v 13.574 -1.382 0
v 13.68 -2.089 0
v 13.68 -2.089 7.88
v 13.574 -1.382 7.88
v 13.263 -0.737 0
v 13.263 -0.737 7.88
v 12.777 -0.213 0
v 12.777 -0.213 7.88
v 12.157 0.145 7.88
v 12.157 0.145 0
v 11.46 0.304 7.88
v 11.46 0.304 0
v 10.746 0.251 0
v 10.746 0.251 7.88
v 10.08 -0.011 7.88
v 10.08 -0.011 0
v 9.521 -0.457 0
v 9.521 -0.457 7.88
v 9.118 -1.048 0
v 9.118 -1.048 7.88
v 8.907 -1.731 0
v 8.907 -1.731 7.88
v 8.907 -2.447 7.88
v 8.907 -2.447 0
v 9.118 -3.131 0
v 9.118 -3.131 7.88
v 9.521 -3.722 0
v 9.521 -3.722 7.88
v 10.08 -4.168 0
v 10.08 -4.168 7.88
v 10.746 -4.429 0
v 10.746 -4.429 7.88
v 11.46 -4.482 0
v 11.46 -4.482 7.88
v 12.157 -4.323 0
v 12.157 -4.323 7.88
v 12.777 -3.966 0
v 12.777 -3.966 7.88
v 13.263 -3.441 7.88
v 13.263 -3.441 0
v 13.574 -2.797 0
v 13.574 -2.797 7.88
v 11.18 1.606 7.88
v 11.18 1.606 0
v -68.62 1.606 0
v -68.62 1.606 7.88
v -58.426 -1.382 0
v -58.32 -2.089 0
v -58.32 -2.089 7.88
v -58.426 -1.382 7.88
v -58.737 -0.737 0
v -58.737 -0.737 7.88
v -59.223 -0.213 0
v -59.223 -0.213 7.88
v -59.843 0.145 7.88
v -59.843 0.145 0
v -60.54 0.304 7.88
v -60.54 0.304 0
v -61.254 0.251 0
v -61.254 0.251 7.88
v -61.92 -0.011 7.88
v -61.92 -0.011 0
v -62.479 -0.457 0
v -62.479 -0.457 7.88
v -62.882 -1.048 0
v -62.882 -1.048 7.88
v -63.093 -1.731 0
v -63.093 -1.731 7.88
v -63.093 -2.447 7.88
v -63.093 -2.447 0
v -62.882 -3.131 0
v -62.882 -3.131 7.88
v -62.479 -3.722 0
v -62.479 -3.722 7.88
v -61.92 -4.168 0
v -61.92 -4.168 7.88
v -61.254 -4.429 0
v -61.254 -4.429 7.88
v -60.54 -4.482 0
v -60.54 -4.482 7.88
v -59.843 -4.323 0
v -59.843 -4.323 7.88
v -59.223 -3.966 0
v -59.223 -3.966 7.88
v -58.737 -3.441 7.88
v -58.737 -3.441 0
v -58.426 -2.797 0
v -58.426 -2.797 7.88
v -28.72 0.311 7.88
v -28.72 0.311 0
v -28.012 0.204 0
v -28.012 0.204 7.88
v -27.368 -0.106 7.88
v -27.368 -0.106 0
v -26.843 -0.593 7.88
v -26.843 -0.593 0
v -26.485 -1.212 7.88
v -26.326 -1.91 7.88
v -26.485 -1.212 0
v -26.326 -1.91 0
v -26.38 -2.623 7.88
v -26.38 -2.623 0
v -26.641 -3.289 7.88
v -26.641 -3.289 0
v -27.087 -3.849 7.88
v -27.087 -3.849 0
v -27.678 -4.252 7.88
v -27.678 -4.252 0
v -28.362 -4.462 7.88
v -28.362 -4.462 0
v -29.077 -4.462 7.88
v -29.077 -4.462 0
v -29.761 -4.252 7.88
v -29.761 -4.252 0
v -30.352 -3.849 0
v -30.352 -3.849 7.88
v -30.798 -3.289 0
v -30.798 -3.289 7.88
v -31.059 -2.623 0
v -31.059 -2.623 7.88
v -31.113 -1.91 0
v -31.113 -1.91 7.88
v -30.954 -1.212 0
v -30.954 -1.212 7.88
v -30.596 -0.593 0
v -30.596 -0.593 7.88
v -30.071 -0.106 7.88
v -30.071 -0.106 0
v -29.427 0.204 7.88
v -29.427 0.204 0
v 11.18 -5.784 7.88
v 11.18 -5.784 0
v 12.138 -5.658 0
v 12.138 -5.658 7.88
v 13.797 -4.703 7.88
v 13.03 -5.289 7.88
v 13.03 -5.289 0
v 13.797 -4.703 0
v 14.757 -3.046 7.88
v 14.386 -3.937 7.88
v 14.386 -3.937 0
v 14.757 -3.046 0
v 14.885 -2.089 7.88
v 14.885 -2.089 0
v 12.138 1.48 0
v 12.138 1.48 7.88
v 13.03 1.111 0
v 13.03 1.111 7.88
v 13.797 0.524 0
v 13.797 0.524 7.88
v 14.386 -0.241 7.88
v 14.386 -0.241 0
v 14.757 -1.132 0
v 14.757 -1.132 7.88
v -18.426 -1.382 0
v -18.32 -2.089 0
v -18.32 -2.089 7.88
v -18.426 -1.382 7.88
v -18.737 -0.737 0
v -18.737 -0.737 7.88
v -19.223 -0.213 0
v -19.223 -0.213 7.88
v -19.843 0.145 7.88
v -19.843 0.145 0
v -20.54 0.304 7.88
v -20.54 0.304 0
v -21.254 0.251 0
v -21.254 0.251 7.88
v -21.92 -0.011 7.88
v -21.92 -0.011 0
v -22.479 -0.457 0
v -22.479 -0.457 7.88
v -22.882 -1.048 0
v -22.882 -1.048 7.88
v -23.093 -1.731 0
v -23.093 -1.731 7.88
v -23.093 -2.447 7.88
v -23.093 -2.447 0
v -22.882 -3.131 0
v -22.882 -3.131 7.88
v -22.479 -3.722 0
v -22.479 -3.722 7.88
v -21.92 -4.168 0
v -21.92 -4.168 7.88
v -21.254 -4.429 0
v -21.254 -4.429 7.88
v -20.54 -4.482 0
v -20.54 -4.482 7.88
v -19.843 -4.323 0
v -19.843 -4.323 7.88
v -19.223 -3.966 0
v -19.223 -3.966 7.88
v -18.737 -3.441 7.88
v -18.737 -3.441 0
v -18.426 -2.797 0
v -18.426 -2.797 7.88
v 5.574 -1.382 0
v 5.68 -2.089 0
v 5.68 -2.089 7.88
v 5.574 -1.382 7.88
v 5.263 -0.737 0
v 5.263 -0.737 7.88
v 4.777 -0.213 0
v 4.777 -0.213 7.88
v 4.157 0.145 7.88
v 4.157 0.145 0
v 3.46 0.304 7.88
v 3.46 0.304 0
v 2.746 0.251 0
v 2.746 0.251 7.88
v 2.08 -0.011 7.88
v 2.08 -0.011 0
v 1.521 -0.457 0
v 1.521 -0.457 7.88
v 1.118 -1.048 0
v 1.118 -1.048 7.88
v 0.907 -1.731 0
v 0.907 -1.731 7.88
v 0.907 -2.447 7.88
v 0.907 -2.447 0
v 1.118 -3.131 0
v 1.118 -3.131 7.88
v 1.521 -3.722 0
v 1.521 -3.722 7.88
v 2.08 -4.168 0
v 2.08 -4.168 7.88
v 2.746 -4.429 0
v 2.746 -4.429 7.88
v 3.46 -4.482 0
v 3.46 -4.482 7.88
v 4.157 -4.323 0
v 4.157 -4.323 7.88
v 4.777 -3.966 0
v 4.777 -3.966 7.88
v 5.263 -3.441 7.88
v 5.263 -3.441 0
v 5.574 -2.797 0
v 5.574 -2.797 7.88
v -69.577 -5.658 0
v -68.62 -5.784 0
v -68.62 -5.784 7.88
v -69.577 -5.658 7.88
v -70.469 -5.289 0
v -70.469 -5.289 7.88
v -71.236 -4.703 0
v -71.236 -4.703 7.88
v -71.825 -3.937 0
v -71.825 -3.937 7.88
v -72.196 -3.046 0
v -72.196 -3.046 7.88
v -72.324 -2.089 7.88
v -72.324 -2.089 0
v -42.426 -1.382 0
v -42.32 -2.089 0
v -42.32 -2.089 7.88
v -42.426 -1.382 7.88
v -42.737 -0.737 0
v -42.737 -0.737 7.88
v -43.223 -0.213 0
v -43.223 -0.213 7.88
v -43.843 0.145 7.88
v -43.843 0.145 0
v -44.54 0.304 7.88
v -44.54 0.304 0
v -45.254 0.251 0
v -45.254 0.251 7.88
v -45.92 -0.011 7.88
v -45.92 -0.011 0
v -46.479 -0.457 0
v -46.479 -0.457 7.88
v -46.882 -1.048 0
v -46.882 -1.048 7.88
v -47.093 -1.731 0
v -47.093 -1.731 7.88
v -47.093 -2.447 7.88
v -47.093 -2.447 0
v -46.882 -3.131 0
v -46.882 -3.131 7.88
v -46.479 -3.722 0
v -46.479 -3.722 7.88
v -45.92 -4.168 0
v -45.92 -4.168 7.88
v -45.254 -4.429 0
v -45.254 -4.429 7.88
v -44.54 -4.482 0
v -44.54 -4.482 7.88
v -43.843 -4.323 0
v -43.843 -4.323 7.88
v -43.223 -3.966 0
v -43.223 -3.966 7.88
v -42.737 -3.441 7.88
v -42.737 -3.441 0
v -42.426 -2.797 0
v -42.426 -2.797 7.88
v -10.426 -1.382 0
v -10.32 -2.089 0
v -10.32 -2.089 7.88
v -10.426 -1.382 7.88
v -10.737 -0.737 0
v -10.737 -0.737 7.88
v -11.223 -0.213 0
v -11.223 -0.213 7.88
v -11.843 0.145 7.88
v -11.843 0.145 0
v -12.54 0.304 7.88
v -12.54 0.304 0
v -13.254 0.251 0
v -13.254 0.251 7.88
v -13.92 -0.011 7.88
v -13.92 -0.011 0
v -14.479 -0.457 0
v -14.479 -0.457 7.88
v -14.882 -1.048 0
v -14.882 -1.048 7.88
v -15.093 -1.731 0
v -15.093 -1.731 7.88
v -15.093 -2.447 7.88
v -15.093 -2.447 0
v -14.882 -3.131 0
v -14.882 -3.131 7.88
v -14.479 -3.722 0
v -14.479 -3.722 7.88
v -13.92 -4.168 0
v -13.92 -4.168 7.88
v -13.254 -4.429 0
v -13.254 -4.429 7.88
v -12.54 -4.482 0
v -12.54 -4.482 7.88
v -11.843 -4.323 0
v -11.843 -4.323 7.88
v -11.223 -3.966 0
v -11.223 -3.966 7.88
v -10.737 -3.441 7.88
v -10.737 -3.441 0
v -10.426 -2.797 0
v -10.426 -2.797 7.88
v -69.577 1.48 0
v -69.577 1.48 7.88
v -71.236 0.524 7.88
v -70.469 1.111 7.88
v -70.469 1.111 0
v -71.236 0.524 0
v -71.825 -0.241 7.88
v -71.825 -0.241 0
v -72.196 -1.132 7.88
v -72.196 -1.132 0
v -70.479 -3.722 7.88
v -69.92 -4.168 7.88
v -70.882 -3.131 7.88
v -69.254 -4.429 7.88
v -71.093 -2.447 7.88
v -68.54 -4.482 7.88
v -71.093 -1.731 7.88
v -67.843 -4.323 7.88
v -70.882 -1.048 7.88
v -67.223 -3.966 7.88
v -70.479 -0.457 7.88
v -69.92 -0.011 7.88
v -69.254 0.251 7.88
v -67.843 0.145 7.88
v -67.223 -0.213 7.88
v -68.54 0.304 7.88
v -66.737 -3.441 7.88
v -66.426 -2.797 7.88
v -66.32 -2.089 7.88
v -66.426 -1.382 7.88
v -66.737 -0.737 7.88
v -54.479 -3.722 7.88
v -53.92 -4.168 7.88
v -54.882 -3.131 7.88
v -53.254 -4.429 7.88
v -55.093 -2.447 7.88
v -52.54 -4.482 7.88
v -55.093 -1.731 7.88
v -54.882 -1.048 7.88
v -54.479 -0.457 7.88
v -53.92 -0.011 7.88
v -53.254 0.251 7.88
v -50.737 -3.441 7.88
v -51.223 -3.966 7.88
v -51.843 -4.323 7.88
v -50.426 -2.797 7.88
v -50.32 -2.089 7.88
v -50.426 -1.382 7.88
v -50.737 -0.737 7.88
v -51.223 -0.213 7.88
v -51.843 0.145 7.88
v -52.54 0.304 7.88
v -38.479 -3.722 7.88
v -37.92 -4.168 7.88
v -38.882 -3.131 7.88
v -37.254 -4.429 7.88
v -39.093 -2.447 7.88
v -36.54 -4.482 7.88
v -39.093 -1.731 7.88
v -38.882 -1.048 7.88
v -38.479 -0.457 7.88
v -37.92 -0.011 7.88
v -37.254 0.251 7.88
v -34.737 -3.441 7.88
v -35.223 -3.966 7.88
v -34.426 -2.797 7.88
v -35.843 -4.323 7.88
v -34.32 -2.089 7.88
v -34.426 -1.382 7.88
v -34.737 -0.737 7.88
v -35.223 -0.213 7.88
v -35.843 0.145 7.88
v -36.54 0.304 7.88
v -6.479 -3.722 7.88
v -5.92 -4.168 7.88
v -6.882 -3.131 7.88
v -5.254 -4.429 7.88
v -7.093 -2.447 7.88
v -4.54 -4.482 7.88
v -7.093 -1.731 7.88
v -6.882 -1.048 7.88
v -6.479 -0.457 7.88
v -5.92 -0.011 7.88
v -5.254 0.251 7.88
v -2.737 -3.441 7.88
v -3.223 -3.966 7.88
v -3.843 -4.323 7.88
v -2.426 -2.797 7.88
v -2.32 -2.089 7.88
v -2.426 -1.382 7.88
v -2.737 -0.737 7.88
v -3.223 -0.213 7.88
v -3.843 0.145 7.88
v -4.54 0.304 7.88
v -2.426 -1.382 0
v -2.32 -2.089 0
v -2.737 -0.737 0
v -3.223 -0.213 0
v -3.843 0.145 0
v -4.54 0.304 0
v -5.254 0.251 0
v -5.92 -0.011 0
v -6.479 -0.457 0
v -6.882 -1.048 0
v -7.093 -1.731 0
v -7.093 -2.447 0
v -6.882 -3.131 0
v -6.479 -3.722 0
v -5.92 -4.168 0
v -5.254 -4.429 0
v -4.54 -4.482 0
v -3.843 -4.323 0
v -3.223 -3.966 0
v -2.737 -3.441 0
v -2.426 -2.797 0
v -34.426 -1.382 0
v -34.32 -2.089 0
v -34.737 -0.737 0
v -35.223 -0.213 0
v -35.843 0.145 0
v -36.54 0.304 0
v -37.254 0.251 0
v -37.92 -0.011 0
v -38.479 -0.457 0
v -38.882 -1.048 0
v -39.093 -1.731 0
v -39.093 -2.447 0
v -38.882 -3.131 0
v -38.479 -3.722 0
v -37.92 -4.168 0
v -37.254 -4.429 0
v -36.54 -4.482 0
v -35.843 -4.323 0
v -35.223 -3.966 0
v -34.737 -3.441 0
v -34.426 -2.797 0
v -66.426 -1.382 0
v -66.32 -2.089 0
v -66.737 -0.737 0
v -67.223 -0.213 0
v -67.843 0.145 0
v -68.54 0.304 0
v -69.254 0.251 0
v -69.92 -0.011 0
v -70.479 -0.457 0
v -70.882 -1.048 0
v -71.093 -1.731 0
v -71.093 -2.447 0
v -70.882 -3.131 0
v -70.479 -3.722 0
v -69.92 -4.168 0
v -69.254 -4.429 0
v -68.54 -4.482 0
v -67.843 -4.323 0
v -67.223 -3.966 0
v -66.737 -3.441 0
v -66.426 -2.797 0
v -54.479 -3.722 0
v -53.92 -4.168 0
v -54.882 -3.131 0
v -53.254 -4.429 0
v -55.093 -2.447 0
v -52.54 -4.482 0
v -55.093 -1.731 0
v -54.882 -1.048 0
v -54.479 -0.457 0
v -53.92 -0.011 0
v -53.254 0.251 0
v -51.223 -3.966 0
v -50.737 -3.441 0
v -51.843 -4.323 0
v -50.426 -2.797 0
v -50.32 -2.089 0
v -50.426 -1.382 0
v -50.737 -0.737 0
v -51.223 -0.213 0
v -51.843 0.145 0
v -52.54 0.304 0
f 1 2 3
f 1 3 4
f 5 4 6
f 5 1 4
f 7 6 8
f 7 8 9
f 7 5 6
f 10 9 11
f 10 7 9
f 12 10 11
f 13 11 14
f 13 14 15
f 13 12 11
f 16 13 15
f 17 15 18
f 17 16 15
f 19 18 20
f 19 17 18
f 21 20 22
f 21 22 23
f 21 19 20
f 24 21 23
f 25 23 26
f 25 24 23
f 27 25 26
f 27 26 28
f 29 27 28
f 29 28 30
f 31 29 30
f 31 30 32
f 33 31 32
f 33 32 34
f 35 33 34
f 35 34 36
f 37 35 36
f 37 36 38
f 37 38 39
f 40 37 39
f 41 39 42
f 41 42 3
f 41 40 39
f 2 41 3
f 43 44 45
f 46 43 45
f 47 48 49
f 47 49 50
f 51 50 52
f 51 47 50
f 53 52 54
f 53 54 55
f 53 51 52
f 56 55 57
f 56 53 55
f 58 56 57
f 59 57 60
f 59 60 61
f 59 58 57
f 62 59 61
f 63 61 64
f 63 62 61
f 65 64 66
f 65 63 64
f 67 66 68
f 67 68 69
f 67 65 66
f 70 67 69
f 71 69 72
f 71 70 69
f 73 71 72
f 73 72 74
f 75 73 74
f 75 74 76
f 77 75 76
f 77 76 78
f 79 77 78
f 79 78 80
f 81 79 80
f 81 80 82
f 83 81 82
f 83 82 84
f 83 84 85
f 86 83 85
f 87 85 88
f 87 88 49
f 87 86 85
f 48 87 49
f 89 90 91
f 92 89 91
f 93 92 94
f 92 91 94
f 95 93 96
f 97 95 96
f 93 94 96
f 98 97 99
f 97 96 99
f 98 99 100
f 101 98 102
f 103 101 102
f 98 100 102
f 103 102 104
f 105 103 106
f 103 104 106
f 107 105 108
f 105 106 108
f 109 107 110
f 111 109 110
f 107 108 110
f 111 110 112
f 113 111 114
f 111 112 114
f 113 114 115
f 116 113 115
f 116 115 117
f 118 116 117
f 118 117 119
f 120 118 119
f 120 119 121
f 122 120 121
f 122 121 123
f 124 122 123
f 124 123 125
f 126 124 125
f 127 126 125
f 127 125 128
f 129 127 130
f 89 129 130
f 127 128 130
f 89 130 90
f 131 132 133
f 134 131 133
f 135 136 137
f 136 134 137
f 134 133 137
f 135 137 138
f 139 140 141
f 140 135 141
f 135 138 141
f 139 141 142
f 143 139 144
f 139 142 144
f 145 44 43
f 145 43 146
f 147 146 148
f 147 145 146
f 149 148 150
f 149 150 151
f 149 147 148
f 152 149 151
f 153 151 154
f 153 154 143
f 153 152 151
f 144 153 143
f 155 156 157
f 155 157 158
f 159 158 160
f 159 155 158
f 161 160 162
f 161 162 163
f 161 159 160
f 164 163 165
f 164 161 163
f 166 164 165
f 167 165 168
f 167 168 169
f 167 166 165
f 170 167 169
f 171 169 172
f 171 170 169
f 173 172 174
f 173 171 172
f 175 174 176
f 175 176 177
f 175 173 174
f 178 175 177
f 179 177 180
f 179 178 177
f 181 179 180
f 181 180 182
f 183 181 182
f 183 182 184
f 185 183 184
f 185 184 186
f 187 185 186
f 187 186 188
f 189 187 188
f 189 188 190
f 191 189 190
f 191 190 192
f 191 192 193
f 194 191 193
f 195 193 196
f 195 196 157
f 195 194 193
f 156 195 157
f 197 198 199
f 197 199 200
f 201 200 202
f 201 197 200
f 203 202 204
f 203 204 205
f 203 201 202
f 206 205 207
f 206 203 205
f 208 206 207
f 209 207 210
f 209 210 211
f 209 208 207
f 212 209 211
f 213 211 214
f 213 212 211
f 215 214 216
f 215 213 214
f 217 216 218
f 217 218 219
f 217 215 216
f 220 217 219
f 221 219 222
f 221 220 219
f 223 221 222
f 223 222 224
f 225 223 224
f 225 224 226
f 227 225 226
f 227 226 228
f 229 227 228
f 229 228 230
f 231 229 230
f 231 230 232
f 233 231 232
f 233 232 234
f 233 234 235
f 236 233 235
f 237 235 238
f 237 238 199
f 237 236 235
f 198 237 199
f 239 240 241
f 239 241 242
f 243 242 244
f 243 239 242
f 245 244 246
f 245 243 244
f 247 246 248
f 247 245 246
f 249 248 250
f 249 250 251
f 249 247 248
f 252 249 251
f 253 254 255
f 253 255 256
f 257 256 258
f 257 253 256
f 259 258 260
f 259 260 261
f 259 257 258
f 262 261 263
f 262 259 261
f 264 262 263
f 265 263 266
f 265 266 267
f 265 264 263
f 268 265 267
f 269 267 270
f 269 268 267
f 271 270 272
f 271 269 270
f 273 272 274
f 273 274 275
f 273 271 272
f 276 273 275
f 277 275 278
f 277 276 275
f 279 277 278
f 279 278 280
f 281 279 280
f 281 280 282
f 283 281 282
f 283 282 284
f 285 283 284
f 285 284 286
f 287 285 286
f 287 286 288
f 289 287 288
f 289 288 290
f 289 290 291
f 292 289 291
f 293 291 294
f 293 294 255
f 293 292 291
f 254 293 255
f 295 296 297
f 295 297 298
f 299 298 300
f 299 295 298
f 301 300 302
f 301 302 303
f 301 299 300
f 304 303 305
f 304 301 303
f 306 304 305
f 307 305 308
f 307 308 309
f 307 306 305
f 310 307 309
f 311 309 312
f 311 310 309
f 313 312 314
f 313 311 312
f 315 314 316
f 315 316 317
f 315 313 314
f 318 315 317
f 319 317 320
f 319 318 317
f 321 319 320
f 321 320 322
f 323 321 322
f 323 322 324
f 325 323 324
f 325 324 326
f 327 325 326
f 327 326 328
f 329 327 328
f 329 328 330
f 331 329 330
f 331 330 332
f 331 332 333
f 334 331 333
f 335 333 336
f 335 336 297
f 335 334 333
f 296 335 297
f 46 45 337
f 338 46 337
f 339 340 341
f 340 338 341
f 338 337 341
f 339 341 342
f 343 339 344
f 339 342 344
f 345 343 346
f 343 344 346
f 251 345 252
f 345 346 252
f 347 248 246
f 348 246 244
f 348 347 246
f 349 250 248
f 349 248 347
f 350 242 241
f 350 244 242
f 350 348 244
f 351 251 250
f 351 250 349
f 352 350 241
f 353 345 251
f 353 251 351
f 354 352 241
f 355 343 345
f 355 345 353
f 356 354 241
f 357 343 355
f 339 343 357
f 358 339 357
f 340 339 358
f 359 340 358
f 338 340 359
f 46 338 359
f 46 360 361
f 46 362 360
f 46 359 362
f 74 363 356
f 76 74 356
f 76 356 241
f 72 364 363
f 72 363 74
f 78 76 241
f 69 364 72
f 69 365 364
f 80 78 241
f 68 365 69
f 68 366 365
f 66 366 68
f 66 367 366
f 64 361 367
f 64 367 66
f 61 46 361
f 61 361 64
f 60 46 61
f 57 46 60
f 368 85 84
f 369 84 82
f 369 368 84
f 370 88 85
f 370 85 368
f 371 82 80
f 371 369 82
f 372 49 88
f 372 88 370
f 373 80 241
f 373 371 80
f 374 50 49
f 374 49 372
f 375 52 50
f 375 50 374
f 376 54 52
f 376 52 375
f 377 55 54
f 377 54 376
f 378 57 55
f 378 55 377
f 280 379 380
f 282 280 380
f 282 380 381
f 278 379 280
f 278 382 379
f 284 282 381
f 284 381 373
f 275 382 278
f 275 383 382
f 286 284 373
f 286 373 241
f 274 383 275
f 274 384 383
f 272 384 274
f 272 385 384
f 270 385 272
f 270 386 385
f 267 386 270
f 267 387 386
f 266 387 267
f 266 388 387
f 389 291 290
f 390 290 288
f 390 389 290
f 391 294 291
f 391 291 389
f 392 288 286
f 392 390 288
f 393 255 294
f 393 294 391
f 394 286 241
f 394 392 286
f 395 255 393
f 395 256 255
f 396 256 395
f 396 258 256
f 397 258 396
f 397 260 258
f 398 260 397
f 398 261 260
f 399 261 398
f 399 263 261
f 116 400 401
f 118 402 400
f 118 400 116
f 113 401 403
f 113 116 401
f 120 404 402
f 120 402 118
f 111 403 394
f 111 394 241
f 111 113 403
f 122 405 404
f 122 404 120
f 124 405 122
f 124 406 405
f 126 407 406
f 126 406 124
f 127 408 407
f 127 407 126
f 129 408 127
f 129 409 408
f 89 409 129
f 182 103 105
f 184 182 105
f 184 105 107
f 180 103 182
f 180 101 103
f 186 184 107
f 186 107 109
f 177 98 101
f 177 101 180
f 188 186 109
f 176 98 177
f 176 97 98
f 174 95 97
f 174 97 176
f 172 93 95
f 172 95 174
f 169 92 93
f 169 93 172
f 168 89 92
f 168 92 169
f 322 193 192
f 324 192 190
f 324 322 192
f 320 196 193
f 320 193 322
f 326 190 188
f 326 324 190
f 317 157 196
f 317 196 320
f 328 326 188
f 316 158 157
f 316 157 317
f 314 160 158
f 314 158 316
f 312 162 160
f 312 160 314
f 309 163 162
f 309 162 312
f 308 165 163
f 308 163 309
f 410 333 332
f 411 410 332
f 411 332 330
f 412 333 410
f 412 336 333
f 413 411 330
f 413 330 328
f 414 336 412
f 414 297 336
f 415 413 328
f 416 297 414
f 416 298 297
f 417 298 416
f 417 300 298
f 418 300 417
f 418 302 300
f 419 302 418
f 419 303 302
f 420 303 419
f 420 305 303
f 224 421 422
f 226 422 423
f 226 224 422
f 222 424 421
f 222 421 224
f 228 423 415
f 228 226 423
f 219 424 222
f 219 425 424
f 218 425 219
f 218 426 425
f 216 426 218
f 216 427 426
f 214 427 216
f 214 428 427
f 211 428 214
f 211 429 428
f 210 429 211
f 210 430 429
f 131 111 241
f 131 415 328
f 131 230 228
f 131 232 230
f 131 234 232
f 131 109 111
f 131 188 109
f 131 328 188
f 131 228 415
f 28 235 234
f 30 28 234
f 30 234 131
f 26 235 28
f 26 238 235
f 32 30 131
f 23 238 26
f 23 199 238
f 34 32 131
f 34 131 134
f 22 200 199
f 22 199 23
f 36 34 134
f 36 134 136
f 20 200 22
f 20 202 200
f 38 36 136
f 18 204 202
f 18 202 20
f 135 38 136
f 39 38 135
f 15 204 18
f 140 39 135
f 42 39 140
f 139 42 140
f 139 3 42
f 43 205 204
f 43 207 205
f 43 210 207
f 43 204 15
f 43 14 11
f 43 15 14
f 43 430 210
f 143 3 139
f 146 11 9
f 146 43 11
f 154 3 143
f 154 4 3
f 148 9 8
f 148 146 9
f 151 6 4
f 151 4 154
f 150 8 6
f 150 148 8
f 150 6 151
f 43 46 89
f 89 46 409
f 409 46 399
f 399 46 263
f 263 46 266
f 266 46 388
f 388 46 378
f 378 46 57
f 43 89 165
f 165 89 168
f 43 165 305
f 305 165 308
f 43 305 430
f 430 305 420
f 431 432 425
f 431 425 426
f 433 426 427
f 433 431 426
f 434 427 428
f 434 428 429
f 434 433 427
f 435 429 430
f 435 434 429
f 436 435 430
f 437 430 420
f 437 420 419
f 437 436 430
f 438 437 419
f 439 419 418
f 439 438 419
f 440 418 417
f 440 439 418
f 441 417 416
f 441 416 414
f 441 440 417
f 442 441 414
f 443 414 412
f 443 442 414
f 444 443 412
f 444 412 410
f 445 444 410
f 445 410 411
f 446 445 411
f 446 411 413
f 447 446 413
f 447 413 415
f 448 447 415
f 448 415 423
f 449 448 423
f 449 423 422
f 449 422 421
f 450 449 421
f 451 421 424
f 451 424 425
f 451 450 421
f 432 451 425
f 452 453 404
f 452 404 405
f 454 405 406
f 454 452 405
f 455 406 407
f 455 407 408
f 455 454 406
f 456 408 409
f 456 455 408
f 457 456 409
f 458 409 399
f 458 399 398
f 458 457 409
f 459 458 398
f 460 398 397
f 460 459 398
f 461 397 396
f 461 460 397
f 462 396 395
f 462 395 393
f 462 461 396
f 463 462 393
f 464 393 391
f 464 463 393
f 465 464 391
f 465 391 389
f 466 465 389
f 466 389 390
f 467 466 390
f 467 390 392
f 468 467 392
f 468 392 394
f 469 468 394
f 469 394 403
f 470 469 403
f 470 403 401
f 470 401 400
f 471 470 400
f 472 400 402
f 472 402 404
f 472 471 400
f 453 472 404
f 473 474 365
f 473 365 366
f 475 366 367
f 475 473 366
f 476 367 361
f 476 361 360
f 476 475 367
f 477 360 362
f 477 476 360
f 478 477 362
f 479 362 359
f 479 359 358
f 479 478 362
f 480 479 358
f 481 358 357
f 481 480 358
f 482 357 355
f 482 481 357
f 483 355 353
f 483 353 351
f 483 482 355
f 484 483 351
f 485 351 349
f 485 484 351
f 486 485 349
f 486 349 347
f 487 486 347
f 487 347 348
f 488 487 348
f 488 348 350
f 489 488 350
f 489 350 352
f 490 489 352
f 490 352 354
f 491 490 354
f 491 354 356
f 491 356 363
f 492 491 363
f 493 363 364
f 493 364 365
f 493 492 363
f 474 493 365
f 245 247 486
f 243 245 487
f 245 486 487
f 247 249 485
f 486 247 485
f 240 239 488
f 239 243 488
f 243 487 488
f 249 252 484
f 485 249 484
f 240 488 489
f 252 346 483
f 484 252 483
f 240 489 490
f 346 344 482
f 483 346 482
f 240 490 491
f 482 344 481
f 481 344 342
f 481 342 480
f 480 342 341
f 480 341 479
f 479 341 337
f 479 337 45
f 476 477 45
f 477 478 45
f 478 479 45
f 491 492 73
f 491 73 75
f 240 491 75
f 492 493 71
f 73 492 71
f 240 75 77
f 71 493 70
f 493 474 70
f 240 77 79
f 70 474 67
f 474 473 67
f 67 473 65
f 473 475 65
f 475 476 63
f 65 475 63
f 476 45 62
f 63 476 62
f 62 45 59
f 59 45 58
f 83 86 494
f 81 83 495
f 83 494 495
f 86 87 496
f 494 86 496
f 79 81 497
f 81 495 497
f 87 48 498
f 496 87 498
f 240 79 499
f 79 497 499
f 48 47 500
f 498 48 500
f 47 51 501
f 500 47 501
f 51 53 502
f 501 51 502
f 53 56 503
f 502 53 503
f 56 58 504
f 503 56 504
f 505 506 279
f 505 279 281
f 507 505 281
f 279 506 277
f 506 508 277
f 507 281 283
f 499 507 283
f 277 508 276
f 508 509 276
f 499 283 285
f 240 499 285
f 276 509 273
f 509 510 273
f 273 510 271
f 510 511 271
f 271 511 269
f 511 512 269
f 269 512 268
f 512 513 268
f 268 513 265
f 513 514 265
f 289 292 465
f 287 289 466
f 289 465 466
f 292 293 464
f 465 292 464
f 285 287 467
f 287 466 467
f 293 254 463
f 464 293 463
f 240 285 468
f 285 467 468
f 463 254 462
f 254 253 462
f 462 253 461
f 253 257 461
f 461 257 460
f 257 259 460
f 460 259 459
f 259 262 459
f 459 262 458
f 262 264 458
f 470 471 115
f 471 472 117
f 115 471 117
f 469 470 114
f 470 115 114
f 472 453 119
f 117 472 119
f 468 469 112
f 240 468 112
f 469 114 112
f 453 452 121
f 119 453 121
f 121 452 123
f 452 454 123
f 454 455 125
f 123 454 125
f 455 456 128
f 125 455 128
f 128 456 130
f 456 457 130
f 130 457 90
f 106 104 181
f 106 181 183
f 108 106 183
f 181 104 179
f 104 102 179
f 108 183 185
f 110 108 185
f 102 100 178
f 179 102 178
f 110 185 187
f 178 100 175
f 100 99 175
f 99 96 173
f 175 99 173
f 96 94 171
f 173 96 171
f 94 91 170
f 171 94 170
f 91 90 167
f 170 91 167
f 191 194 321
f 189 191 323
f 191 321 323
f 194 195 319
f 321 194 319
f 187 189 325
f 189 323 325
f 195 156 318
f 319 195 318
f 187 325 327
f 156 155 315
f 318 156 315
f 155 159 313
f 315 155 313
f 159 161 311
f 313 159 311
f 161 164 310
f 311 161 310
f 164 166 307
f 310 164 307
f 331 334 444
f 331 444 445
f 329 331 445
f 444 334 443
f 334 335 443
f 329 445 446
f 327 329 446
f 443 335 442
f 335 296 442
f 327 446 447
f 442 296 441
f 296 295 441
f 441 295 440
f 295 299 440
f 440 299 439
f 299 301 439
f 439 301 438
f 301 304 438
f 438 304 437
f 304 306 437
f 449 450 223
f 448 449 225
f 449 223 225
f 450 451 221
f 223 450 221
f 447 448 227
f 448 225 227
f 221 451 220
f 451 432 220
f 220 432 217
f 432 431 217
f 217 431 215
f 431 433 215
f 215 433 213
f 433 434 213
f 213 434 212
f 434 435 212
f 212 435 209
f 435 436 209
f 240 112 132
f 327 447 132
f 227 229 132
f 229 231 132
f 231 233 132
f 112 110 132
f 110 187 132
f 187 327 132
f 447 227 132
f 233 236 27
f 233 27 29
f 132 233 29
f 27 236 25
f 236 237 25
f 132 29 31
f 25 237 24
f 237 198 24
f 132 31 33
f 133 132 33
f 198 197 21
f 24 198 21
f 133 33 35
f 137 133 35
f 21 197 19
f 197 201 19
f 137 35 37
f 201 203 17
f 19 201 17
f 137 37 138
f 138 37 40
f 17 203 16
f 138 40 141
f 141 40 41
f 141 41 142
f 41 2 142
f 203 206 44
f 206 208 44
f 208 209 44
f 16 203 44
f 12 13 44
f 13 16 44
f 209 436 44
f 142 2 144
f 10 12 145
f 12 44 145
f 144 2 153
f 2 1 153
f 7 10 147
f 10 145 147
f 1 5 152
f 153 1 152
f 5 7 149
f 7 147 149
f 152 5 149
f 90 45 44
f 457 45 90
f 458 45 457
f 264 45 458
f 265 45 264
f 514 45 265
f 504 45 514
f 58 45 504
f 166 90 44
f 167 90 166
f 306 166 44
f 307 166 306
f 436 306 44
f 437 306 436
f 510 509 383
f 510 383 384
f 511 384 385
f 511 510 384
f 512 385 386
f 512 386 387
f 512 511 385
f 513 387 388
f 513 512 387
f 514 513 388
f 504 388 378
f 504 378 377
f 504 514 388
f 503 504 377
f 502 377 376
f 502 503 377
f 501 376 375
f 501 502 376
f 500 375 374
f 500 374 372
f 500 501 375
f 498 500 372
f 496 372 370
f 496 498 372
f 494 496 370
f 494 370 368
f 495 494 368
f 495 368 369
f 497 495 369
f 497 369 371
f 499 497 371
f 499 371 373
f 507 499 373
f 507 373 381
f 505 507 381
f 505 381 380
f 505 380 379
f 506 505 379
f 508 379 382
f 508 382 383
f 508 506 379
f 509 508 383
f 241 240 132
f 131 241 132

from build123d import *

# Parameters (mm, degrees)
F0_R        = 2.4
F1_DEPTH    = 7.88
F2_T1_DEPTH = 26.405


# Not quite as in the source:
# - a fillet or chamfer that OpenCascade refuses, or shapes differently, is made with other operations: its cross-section is extruded or revolved along the edge and cut away or added


with BuildPart() as f1:
    # F0 (on Top) → F1 (new body)
    with BuildSketch(Plane.XY):
        Polygon((14.8854916829, 1.6058013724), (-28.7195083171, 1.6058013724), (-72.3245083171, 1.6058013724), (-72.3245083171, -2.0891986276), (-72.3245083171, -5.7841986276), (-28.7195083171, -5.7841986276), (14.8854916829, -5.7841986276), (14.8854916829, -2.0891986276), align=None)
        with Locations((-68.7195083171, -2.0891986276)):
            Circle(F0_R, mode=Mode.SUBTRACT)
        with Locations((-60.7195083171, -2.0891986276)):
            Circle(F0_R, mode=Mode.SUBTRACT)
        with Locations((-52.7195083171, -2.0891986276)):
            Circle(F0_R, mode=Mode.SUBTRACT)
        with Locations((-44.7195083171, -2.0891986276)):
            Circle(F0_R, mode=Mode.SUBTRACT)
        with Locations((-36.7195083171, -2.0891986276)):
            Circle(F0_R, mode=Mode.SUBTRACT)
        with BuildLine():
            ThreePointArc((-28.7195083171, -4.4891986276), (-31.1195083171, -2.0891986276), (-28.7195083171, 0.3108013724))
            ThreePointArc((-28.7195083171, 0.3108013724), (-26.3195083171, -2.0891986276), (-28.7195083171, -4.4891986276))
        make_face(mode=Mode.SUBTRACT)
        with Locations((-20.7195083171, -2.0891986276)):
            Circle(F0_R, mode=Mode.SUBTRACT)
        with Locations((-12.7195083171, -2.0891986276)):
            Circle(F0_R, mode=Mode.SUBTRACT)
        with Locations((-4.7195083171, -2.0891986276)):
            Circle(F0_R, mode=Mode.SUBTRACT)
        with Locations((3.2804916829, -2.0891986276)):
            Circle(F0_R, mode=Mode.SUBTRACT)
        with Locations((11.2804916829, -2.0891986276)):
            Circle(F0_R, mode=Mode.SUBTRACT)
    extrude(amount=F1_DEPTH)

    # F2: fillet of radius 3.705 on 4 edges, made by hand

    # F2_s2 → F2_t1 (cut)
    with BuildSketch(Plane.XY.offset(-9.2625)):
        with BuildLine():
            ThreePointArc((11.1804916829, 1.6058013724), (13.8003223072, 0.5206319967), (14.8854916829, -2.0991986276))
            Line((14.8854916829, -2.0991986276), (14.8854916829, 1.6058013724))
            Line((14.8854916829, 1.6058013724), (11.1804916829, 1.6058013724))
        make_face()
        with BuildLine():
            ThreePointArc((11.1804916829, -5.7841986276), (13.8003223072, -4.6990292519), (14.8854916829, -2.0791986276))
            Line((14.8854916829, -2.0791986276), (14.8854916829, -5.7841986276))
            Line((14.8854916829, -5.7841986276), (11.1804916829, -5.7841986276))
        make_face()
        with BuildLine():
            ThreePointArc((-68.6195083171, 1.6058013724), (-71.2393389413, 0.5206319967), (-72.3245083171, -2.0991986276))
            Line((-72.3245083171, -2.0991986276), (-72.3245083171, 1.6058013724))
            Line((-72.3245083171, 1.6058013724), (-68.6195083171, 1.6058013724))
        make_face()
        with BuildLine():
            ThreePointArc((-68.6195083171, -5.7841986276), (-71.2393389413, -4.6990292519), (-72.3245083171, -2.0791986276))
            Line((-72.3245083171, -2.0791986276), (-72.3245083171, -5.7841986276))
            Line((-72.3245083171, -5.7841986276), (-68.6195083171, -5.7841986276))
        make_face()
    extrude(amount=F2_T1_DEPTH, mode=Mode.SUBTRACT)


solid = f1.part
